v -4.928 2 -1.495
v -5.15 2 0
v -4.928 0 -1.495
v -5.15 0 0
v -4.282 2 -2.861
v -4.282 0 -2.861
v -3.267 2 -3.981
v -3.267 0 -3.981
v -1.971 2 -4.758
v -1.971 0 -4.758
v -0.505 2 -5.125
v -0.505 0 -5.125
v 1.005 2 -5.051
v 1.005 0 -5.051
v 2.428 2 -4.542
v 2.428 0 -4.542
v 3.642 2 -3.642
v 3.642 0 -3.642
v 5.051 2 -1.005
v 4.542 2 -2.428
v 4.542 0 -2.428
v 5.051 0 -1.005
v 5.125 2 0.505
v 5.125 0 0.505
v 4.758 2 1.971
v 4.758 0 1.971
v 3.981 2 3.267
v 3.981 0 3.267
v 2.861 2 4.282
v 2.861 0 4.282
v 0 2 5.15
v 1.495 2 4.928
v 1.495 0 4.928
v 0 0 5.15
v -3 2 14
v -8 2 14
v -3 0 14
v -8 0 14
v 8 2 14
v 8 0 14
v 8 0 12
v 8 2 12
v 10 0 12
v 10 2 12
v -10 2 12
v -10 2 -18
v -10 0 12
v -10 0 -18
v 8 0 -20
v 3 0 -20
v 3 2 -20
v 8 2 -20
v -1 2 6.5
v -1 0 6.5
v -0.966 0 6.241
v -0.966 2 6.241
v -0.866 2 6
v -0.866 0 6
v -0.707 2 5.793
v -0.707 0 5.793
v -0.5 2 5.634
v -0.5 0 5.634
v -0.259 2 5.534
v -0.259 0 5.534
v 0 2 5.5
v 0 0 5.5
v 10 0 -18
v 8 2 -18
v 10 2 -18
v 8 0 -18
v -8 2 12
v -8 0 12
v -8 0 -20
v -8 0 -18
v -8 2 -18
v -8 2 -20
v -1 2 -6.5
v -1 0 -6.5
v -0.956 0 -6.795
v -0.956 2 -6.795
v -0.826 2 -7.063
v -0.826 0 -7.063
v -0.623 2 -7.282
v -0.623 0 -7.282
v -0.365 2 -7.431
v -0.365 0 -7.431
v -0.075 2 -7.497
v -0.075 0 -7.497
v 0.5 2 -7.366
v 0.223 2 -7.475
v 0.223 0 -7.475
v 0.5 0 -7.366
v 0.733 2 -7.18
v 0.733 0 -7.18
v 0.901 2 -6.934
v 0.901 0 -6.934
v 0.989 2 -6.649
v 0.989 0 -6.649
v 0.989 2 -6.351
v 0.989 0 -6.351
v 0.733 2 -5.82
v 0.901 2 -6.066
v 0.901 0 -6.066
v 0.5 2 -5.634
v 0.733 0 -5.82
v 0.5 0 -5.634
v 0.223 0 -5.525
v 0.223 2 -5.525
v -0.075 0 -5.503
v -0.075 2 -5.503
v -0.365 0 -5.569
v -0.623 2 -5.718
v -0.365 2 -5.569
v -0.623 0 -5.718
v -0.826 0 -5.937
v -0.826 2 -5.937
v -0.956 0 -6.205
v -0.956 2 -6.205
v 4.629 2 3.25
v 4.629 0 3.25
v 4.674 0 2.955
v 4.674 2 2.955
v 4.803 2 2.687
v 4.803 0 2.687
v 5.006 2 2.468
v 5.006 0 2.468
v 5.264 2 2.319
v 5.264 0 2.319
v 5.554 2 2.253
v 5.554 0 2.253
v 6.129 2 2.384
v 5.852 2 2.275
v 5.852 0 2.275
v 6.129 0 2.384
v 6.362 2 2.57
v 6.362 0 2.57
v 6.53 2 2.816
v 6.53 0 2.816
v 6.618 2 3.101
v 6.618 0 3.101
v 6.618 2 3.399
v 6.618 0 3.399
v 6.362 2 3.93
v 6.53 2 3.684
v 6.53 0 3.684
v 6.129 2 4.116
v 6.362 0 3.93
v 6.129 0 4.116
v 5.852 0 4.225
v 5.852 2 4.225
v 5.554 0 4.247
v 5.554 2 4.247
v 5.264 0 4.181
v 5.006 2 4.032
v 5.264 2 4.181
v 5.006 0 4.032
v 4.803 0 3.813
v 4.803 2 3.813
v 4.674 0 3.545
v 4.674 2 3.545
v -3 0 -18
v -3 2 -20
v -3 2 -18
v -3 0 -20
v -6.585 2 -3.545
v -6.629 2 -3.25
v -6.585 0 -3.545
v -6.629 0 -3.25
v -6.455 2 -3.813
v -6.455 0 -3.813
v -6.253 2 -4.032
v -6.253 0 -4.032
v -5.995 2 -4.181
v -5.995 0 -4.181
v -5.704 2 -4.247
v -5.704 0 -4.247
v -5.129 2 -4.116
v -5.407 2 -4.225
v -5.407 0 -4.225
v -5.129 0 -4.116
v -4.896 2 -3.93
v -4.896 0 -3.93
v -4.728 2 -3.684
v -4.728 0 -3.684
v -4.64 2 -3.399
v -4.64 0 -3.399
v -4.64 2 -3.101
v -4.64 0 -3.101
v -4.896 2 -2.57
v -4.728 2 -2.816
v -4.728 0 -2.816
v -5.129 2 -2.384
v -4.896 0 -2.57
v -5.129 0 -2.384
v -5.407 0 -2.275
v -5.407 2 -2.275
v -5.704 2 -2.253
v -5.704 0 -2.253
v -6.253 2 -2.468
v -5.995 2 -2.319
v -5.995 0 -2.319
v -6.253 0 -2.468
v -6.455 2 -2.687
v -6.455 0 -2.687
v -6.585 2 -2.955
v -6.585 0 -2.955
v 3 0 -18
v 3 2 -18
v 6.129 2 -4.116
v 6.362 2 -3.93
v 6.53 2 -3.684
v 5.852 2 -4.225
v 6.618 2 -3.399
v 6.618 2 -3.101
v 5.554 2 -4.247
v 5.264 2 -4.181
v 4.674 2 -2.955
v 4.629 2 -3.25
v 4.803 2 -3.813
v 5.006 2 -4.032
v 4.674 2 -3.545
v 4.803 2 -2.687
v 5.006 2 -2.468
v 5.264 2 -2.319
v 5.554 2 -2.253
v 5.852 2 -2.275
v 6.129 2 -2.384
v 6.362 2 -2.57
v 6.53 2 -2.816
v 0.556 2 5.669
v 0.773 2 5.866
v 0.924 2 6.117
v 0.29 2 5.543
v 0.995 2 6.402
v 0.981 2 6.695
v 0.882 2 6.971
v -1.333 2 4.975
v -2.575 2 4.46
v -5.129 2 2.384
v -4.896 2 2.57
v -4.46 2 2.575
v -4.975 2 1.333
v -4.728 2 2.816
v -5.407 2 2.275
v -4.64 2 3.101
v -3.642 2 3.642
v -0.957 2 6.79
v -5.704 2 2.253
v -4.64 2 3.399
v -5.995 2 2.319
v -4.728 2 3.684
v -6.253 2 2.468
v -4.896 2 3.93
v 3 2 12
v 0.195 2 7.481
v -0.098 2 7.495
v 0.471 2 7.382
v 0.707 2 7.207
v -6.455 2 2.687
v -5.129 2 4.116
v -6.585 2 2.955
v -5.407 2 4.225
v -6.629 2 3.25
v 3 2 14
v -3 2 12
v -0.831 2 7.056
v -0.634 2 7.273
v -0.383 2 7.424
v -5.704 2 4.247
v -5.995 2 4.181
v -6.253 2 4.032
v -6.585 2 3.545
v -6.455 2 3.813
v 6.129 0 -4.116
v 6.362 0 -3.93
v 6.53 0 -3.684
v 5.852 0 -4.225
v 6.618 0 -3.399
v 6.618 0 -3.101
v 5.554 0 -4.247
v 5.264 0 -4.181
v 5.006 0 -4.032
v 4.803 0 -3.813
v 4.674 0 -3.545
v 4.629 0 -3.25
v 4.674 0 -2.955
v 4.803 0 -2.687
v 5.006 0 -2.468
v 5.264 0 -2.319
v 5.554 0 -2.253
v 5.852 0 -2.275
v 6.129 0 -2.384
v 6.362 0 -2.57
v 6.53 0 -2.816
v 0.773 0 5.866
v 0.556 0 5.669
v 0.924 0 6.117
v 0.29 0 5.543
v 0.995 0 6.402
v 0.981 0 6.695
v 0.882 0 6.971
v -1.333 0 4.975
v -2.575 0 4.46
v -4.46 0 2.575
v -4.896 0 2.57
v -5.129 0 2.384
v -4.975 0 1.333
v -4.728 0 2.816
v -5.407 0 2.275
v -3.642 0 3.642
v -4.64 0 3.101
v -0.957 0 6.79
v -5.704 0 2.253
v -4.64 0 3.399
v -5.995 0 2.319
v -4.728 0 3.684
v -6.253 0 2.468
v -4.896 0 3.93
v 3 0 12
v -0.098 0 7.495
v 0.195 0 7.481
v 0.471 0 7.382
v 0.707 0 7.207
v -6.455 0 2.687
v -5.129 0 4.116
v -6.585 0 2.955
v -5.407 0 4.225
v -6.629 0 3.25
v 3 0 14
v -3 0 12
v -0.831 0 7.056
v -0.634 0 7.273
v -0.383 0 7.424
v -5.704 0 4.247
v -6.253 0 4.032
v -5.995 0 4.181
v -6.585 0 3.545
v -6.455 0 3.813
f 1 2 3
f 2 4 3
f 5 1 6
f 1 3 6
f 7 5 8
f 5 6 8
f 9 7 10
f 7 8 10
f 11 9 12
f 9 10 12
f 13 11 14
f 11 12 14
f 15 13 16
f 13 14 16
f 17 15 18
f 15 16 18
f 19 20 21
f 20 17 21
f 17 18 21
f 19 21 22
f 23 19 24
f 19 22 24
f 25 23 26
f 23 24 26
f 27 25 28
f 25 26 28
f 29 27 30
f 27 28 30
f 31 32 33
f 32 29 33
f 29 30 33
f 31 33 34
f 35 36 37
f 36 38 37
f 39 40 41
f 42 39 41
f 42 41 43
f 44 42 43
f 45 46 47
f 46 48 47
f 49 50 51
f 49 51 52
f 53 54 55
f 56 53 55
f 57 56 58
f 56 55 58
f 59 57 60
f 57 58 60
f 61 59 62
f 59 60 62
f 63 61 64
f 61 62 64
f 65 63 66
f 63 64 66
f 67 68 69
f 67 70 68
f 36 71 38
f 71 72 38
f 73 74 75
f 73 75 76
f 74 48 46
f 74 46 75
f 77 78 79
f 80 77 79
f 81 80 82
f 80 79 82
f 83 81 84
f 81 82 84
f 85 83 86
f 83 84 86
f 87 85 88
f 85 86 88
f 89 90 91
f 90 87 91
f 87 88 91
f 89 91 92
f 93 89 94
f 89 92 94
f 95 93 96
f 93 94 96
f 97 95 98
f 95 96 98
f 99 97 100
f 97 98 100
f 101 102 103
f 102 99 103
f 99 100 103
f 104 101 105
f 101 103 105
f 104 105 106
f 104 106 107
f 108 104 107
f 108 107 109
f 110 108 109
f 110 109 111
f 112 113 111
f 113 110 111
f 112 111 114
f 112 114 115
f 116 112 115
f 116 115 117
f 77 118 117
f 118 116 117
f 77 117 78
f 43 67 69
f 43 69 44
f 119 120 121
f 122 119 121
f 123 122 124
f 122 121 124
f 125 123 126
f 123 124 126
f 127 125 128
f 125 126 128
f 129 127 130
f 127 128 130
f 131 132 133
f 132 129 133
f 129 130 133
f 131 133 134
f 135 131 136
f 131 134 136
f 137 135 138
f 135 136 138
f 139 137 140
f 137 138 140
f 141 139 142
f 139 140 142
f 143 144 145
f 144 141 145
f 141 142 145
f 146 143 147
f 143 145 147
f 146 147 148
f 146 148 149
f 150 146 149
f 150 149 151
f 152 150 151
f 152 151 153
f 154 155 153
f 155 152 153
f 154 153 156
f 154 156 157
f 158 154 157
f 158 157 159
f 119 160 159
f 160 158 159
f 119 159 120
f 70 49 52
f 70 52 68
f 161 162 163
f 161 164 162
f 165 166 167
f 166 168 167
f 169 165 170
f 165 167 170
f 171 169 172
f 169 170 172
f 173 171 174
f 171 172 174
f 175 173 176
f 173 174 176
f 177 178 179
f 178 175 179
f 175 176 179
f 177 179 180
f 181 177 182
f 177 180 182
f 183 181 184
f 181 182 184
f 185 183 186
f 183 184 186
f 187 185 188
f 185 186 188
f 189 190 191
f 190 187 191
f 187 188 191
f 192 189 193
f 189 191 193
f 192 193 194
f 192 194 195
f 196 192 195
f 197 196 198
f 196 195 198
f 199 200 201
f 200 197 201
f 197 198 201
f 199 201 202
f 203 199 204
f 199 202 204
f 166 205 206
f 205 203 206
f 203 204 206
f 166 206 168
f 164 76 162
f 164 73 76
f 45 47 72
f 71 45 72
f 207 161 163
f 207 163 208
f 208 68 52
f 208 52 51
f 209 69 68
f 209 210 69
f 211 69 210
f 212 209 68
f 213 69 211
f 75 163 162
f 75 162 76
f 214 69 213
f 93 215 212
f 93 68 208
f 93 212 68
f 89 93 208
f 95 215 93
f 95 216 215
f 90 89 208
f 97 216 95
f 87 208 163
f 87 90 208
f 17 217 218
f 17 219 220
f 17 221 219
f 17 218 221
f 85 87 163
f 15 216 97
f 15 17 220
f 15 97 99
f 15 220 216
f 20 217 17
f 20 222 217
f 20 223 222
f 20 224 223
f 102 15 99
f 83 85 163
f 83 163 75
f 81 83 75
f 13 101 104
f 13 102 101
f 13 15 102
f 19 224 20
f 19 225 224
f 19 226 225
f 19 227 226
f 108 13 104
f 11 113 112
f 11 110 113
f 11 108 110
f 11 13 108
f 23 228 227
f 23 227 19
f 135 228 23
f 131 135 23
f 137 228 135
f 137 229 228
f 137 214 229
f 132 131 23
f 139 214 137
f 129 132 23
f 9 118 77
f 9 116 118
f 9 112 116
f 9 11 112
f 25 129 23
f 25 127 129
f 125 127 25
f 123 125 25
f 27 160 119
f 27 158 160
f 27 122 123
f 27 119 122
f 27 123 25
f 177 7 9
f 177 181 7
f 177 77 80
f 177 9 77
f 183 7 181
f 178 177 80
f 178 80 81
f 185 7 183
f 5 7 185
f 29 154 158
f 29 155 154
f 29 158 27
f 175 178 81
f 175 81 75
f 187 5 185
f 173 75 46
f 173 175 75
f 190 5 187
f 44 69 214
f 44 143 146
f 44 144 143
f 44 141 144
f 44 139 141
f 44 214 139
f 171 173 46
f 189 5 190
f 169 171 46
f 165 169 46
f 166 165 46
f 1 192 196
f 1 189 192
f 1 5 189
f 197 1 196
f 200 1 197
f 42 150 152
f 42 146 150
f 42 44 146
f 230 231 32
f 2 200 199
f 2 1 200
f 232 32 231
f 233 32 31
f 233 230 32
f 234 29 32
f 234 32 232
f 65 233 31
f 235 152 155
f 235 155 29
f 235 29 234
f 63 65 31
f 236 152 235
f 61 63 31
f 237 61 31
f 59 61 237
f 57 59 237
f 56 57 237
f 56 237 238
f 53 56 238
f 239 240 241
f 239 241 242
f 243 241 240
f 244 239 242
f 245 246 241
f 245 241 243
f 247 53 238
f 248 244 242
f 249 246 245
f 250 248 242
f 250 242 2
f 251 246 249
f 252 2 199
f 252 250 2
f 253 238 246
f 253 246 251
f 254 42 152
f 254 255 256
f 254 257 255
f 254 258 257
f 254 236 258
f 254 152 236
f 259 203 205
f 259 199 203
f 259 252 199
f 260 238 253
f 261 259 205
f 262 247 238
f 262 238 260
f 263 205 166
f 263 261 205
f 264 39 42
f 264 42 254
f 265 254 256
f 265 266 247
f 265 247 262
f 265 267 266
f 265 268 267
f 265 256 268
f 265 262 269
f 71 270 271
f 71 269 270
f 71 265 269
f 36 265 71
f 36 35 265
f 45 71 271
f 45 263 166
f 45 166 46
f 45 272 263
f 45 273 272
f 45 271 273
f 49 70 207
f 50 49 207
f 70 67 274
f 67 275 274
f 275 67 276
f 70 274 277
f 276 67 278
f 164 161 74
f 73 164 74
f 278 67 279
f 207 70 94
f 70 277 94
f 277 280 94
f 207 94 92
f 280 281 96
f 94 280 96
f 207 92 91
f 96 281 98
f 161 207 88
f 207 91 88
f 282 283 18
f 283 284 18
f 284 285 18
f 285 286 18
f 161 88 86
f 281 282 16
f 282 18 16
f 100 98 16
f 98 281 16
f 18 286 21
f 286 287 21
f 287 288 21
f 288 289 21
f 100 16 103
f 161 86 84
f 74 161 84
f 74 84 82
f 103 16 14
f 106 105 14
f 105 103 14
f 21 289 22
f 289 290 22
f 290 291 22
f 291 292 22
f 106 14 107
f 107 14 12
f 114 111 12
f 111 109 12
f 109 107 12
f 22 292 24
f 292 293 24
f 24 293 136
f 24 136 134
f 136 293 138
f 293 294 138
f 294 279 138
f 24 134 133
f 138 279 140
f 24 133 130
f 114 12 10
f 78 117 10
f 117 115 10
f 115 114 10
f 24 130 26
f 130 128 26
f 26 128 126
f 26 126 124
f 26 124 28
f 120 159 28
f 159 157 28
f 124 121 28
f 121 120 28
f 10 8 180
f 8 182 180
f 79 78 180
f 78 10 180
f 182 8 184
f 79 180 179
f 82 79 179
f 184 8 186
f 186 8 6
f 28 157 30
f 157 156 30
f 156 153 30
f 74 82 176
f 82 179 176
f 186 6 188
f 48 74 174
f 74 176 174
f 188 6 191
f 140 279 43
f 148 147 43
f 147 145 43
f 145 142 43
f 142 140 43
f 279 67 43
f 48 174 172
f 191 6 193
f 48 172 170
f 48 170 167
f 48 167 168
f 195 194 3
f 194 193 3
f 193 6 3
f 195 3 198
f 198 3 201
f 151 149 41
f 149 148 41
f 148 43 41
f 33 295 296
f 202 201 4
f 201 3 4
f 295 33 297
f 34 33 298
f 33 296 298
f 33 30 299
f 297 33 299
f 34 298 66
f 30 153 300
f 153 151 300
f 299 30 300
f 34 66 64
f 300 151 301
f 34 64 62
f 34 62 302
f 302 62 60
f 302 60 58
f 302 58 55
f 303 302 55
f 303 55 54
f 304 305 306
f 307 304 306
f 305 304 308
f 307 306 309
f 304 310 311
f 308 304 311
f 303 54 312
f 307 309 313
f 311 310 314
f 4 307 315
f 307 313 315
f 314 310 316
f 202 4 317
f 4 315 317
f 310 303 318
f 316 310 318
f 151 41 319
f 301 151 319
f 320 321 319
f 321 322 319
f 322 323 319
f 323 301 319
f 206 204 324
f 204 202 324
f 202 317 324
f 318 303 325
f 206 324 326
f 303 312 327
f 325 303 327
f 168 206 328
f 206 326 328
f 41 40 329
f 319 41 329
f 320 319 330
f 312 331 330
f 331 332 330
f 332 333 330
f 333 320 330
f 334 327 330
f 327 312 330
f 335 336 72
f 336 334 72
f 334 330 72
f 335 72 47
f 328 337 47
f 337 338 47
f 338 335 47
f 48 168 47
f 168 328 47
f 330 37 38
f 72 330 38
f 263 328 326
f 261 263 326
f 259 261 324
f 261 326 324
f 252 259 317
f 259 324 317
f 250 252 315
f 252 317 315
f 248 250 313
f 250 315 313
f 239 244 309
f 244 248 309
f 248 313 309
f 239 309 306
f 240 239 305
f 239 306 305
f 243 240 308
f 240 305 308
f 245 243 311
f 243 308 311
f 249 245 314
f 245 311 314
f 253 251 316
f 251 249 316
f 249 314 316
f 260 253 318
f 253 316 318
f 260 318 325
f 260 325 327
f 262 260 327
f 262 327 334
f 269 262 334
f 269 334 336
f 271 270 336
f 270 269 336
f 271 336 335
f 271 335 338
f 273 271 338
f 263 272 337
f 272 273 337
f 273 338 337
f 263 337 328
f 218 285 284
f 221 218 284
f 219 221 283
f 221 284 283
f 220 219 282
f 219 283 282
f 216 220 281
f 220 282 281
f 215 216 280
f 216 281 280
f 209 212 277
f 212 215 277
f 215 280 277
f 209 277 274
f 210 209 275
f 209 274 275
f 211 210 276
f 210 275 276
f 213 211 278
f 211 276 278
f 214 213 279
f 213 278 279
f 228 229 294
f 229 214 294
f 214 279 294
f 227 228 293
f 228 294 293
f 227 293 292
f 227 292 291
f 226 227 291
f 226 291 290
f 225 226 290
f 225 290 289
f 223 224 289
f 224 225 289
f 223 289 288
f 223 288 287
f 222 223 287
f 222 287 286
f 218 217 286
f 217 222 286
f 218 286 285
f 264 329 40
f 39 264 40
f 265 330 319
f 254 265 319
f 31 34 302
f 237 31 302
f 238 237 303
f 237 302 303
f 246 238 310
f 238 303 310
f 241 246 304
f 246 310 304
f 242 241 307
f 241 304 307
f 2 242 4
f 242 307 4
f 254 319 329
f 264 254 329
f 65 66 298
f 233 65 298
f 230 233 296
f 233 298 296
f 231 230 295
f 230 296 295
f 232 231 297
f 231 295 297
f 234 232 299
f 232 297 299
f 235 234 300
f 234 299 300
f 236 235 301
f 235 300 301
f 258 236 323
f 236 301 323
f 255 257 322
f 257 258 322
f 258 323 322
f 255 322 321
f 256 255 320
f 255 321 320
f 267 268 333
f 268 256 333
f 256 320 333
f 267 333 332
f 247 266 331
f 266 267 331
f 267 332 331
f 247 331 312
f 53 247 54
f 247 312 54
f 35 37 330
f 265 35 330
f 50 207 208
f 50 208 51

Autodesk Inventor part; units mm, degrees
ref_plane "YZ Plane" through (0, 0, 0) normal (1, 0, 0) x (0, 1, 0)
ref_plane "XZ Plane" through (0, 0, 0) normal (0, 1, 0) x (-1, 0, 0)
ref_plane "XY Plane" through (0, 0, 0) normal (0, 0, 1) x (1, 0, 0)
sketch "Sketch1" plane through (0, 0, 0) normal (0, 1, 0) x (-1, 0, 0)
  circle A0 centre (0, 0) radius 5.15
  line L0 (10, -18) -> (8, -18)
  line L1 (8, -18) -> (8, -20)
  line L2 (8, -20) -> (3, -20)
  line L3 (3, -20) -> (3, -18)
  line L4 (3, -18) -> (-3, -18)
  line L5 (-3, -18) -> (-3, -20)
  line L6 (-3, -20) -> (-8, -20)
  line L7 (-8, -20) -> (-8, -18)
  line L8 (-8, -18) -> (-10, -18)
  line L9 (10, -18) -> (10, 12)
  line L10 (-10, -18) -> (-10, 12)
  line L11 (10, 12) -> (8, 12)
  line L12 (8, 12) -> (8, 14)
  line L13 (8, 14) -> (3, 14)
  line L14 (3, 14) -> (3, 12)
  line L15 (3, 12) -> (-3, 12)
  line L16 (-3, 12) -> (-3, 14)
  line L17 (-3, 14) -> (-8, 14)
  line L18 (-8, 14) -> (-8, 12)
  line L19 (-8, 12) -> (-10, 12)
  line L20 (0, 0) -> (0, 6.5)
  circle A1 centre (0, 6.5) radius 1
  circle A2 centre (-5.6292, 3.25) radius 1
  circle A3 centre (-5.6292, -3.25) radius 1
  circle A4 centre (0, -6.5) radius 1
  circle A5 centre (5.6292, -3.25) radius 1
  circle A6 centre (5.6292, 3.25) radius 1
  dimension "d7" = 360
  dimension "d33" = 2
  dimension "d34" = 2
  dimension "d35" = 5
  dimension "d36" = 6
  dimension "d37" = 5
  dimension "d42" = 30
  dimension "d43" = 2
  dimension "d44" = 2
  dimension "d45" = 5
  dimension "d46" = 6
  dimension "d47" = 5
  dimension "d48" = 6.5
  dimension "d49" = 2
  dimension "d52" = 360
extrude "Extrusion1" add sketch "Sketch1" along normal blind 2
properties part number "Motor Mount"
